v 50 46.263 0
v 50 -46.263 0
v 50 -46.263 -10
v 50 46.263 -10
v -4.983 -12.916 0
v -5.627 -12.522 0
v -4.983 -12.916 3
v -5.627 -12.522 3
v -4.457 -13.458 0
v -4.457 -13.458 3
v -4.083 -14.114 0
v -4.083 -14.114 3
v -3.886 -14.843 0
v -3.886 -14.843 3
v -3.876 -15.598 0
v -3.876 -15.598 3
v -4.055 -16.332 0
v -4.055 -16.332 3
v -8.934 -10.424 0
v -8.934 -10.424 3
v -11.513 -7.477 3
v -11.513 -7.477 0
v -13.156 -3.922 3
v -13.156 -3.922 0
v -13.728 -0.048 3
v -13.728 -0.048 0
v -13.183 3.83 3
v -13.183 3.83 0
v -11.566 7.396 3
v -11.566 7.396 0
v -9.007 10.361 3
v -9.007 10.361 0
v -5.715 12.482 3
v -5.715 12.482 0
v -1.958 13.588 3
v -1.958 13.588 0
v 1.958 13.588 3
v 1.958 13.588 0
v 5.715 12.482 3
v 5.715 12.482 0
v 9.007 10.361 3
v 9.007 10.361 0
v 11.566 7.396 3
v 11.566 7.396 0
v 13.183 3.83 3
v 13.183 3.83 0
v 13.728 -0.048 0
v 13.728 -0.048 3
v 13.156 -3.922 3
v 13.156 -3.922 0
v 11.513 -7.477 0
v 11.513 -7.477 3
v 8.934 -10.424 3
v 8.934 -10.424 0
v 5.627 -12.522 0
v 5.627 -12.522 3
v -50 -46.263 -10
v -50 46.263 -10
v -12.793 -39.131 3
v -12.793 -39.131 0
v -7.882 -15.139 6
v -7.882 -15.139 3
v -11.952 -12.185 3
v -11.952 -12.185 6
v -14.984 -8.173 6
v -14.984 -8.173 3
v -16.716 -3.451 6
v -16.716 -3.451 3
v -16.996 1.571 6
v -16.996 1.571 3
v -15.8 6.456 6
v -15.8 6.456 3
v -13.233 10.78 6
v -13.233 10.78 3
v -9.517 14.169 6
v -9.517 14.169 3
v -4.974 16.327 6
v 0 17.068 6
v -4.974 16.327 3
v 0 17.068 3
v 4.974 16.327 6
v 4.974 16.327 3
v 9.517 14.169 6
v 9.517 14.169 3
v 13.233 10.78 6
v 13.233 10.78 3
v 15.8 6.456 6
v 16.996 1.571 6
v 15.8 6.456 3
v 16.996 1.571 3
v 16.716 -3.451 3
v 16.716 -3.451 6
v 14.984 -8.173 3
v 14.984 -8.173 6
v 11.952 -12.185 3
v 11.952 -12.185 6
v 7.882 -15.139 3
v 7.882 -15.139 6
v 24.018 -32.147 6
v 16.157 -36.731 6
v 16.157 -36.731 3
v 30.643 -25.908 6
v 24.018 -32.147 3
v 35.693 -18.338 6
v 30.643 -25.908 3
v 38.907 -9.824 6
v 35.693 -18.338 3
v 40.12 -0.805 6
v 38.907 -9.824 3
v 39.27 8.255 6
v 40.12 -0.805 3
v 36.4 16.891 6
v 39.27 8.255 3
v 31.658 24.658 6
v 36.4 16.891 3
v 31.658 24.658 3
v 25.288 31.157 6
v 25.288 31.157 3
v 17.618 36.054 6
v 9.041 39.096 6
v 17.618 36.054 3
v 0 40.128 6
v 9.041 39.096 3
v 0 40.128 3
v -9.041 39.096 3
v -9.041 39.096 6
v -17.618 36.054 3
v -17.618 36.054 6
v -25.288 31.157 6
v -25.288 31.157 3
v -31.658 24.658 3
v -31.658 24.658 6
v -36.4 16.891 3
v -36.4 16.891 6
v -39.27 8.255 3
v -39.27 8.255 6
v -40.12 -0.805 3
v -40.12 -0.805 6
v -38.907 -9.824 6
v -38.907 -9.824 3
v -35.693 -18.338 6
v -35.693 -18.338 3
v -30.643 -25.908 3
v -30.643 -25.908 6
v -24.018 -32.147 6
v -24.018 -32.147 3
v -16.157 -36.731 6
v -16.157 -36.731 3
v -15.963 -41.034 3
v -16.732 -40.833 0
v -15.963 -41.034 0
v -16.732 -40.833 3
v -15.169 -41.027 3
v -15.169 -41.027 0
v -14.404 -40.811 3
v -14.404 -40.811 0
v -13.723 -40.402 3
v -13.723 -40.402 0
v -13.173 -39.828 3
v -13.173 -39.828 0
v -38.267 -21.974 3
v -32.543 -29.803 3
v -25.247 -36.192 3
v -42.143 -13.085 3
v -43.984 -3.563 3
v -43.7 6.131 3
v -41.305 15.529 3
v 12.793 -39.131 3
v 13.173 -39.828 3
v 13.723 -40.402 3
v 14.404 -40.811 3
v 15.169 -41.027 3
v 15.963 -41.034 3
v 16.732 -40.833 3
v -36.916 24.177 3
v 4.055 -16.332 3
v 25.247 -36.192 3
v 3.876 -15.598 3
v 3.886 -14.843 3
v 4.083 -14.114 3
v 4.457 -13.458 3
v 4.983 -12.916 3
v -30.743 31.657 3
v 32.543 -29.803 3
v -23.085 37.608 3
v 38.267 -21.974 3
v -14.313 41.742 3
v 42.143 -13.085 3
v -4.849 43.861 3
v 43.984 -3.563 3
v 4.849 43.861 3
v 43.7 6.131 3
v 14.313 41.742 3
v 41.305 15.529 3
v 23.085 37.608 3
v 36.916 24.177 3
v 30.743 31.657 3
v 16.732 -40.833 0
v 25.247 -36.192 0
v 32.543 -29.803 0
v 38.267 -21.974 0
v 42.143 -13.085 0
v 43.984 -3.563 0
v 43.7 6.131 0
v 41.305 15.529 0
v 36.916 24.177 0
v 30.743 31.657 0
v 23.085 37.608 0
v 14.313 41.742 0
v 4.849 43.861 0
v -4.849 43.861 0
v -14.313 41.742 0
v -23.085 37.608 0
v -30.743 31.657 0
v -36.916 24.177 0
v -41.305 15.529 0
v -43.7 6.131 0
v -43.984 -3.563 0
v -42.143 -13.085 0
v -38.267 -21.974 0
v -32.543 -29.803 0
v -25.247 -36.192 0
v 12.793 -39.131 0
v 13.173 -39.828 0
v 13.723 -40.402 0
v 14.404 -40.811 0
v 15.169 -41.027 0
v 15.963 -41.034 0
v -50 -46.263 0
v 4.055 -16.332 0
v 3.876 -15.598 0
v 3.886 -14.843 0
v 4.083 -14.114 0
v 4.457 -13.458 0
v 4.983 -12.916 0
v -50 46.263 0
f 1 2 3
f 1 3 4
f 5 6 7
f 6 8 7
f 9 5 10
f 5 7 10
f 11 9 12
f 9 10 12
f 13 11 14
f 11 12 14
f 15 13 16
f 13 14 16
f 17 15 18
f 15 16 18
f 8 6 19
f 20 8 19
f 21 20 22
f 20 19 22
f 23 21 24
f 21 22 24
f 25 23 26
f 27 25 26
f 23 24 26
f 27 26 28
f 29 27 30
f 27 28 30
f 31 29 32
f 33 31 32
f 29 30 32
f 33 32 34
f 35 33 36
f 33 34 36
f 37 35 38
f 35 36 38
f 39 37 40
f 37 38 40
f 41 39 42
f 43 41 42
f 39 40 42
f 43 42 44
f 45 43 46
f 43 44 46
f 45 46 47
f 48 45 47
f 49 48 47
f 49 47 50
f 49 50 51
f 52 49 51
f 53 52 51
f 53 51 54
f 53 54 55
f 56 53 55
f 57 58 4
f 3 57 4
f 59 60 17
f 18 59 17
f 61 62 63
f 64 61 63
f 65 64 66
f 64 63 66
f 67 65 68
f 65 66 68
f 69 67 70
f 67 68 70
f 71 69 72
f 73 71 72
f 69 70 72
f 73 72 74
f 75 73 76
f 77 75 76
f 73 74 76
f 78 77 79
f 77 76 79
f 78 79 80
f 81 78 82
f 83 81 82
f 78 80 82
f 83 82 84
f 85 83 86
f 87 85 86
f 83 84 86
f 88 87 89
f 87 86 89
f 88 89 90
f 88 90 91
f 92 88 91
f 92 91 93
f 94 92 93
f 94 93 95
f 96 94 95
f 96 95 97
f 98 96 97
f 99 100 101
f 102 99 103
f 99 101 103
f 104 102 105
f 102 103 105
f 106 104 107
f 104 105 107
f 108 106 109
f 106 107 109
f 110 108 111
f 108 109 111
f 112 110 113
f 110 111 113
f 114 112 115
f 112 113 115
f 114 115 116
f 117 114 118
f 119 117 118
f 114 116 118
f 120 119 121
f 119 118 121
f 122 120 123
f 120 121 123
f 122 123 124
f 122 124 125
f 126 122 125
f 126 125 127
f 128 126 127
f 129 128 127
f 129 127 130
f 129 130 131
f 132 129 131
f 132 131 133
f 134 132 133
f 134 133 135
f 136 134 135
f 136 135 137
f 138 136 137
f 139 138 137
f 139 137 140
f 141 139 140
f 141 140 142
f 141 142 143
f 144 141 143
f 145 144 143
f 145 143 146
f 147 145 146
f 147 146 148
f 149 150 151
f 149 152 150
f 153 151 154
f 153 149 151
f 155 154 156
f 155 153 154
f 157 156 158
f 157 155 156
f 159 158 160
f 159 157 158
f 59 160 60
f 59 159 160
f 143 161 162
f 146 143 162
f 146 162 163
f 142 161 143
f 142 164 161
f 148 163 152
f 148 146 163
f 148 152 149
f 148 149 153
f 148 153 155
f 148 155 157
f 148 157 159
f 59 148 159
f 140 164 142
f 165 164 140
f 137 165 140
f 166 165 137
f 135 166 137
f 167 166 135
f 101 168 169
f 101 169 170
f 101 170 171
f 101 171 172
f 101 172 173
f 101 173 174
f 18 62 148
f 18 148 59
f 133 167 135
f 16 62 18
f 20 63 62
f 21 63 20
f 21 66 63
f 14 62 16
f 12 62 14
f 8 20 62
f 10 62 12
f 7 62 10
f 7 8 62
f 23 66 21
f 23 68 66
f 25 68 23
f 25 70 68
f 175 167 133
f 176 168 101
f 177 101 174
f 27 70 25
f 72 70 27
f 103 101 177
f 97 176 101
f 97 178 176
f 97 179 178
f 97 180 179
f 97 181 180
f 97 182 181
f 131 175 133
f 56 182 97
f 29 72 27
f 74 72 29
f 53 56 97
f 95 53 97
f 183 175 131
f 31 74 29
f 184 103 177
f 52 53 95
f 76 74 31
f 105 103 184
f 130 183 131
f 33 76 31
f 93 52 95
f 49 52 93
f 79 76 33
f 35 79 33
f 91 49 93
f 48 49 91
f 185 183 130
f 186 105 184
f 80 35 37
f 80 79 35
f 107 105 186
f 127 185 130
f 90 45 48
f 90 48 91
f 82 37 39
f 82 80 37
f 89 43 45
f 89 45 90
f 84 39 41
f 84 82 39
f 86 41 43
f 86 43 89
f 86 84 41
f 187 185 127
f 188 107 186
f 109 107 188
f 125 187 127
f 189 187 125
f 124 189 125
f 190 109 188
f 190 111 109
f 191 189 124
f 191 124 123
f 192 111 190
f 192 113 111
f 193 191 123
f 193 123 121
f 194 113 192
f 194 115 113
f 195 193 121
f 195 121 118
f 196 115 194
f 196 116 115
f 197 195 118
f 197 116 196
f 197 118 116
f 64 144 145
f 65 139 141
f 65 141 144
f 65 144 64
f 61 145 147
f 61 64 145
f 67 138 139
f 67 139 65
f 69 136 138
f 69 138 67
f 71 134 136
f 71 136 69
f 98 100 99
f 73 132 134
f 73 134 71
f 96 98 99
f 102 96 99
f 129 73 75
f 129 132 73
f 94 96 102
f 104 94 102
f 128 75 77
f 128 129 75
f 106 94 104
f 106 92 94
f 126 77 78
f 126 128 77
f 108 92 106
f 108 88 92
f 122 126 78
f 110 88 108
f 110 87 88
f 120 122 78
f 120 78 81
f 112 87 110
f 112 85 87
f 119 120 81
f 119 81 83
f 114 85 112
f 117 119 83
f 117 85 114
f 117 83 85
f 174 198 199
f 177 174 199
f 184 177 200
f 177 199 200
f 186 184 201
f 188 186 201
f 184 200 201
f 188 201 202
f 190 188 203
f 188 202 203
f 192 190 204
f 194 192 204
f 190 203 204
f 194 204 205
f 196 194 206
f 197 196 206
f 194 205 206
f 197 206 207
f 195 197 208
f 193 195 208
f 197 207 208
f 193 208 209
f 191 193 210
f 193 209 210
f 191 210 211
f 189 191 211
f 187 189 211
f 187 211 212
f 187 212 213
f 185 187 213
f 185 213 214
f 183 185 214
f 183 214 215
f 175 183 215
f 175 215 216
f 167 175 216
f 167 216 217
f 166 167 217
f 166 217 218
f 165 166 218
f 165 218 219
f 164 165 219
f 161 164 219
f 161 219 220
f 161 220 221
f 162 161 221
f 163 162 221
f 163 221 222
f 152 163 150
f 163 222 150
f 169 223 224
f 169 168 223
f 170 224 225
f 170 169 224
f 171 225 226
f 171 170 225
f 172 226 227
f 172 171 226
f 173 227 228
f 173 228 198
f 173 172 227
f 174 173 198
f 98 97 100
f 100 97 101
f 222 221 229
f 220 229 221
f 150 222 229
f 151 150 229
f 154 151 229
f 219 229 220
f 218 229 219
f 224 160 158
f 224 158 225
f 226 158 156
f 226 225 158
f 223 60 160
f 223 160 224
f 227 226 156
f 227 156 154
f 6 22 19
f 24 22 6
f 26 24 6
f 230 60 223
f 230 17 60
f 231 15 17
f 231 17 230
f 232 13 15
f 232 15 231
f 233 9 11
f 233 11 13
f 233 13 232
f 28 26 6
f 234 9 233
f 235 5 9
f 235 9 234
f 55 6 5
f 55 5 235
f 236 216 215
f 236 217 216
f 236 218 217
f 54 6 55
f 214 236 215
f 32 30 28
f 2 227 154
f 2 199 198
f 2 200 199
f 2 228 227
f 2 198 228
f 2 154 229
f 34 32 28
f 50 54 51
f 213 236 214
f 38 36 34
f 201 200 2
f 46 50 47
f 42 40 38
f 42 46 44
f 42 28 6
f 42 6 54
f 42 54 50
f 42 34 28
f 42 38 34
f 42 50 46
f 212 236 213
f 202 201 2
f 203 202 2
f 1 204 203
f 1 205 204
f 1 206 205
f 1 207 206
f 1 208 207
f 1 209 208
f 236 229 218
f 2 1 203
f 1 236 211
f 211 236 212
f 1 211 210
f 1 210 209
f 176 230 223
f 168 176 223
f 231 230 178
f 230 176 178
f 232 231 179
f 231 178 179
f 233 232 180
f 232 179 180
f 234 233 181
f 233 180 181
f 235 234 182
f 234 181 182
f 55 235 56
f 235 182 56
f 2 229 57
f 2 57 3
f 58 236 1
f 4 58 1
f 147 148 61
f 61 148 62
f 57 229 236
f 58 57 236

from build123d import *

# Parameters (mm, degrees)
F0_W     = 100
F0_H     = 92.5255602876
F1_DEPTH = 10
F2_DEPTH = 3
F3_DEPTH = 6
F4_R     = 3


with BuildPart() as f1:
    # F0 (on Top) → F1 (new body)
    with BuildSketch(Plane.XY):
        Rectangle(F0_W, F0_H)
        with BuildLine():
            ThreePointArc((-13.8530512527, -41.8971102989), (0, 44.1279376406), (13.8530512527, -41.8971102989))
            Line((13.8530512527, -41.8971102989), (2.9358495271, -13.4106839777))
            ThreePointArc((2.9358495271, -13.4106839777), (0, 13.7282794696), (-2.9358495271, -13.4106839777))
            Line((-2.9358495271, -13.4106839777), (-13.8530512527, -41.8971102989))
        make_face(mode=Mode.SUBTRACT)
        with BuildLine():
            Line((2.9358495271, -13.4106839777), (13.8530512527, -41.8971102989))
            ThreePointArc((13.8530512527, -41.8971102989), (0, 44.1279376406), (-13.8530512527, -41.8971102989))
            Line((-13.8530512527, -41.8971102989), (-2.9358495271, -13.4106839777))
            ThreePointArc((-2.9358495271, -13.4106839777), (0, 13.7282794696), (2.9358495271, -13.4106839777))
        make_face()
        with BuildLine():
            ThreePointArc((-16.157050142, -36.7314730169), (0, 40.1279376406), (16.157050142, -36.7314730169))
            Line((16.157050142, -36.7314730169), (7.8820297495, -15.1393320411))
            ThreePointArc((7.8820297495, -15.1393320411), (0, 17.0682678566), (-7.8820297495, -15.1393320411))
            Line((-7.8820297495, -15.1393320411), (-16.157050142, -36.7314730169))
        make_face(mode=Mode.SUBTRACT)
        with BuildLine():
            Line((7.8820297495, -15.1393320411), (16.157050142, -36.7314730169))
            ThreePointArc((16.157050142, -36.7314730169), (0, 40.1279376406), (-16.157050142, -36.7314730169))
            Line((-16.157050142, -36.7314730169), (-7.8820297495, -15.1393320411))
            ThreePointArc((-7.8820297495, -15.1393320411), (0, 17.0682678566), (7.8820297495, -15.1393320411))
        make_face()
    extrude(amount=-F1_DEPTH)

    # F0 (on Top) → F2 (join)
    with BuildSketch(Plane.XY):
        with BuildLine():
            Line((2.9358495271, -13.4106839777), (13.8530512527, -41.8971102989))
            ThreePointArc((13.8530512527, -41.8971102989), (0, 44.1279376406), (-13.8530512527, -41.8971102989))
            Line((-13.8530512527, -41.8971102989), (-2.9358495271, -13.4106839777))
            ThreePointArc((-2.9358495271, -13.4106839777), (0, 13.7282794696), (2.9358495271, -13.4106839777))
        make_face()
        with BuildLine():
            ThreePointArc((-16.157050142, -36.7314730169), (0, 40.1279376406), (16.157050142, -36.7314730169))
            Line((16.157050142, -36.7314730169), (7.8820297495, -15.1393320411))
            ThreePointArc((7.8820297495, -15.1393320411), (0, 17.0682678566), (-7.8820297495, -15.1393320411))
            Line((-7.8820297495, -15.1393320411), (-16.157050142, -36.7314730169))
        make_face(mode=Mode.SUBTRACT)
        with BuildLine():
            Line((7.8820297495, -15.1393320411), (16.157050142, -36.7314730169))
            ThreePointArc((16.157050142, -36.7314730169), (0, 40.1279376406), (-16.157050142, -36.7314730169))
            Line((-16.157050142, -36.7314730169), (-7.8820297495, -15.1393320411))
            ThreePointArc((-7.8820297495, -15.1393320411), (0, 17.0682678566), (7.8820297495, -15.1393320411))
        make_face()
    extrude(amount=F2_DEPTH)

    # F0 (on Top) → F3 (join)
    with BuildSketch(Plane.XY):
        with BuildLine():
            Line((7.8820297495, -15.1393320411), (16.157050142, -36.7314730169))
            ThreePointArc((16.157050142, -36.7314730169), (0, 40.1279376406), (-16.157050142, -36.7314730169))
            Line((-16.157050142, -36.7314730169), (-7.8820297495, -15.1393320411))
            ThreePointArc((-7.8820297495, -15.1393320411), (0, 17.0682678566), (7.8820297495, -15.1393320411))
        make_face()
    extrude(amount=F3_DEPTH)

    # F4
    f4_edges = [f1.edges().sort_by_distance(p)[0] for p in [
        (-2.93585, -13.410684, 1.5),
        (2.93585, -13.410684, 1.5),
        (13.853051, -41.89711, 1.5),
        (-13.853051, -41.89711, 1.5),
    ]]
    fillet(f4_edges, radius=F4_R)


solid = f1.part
